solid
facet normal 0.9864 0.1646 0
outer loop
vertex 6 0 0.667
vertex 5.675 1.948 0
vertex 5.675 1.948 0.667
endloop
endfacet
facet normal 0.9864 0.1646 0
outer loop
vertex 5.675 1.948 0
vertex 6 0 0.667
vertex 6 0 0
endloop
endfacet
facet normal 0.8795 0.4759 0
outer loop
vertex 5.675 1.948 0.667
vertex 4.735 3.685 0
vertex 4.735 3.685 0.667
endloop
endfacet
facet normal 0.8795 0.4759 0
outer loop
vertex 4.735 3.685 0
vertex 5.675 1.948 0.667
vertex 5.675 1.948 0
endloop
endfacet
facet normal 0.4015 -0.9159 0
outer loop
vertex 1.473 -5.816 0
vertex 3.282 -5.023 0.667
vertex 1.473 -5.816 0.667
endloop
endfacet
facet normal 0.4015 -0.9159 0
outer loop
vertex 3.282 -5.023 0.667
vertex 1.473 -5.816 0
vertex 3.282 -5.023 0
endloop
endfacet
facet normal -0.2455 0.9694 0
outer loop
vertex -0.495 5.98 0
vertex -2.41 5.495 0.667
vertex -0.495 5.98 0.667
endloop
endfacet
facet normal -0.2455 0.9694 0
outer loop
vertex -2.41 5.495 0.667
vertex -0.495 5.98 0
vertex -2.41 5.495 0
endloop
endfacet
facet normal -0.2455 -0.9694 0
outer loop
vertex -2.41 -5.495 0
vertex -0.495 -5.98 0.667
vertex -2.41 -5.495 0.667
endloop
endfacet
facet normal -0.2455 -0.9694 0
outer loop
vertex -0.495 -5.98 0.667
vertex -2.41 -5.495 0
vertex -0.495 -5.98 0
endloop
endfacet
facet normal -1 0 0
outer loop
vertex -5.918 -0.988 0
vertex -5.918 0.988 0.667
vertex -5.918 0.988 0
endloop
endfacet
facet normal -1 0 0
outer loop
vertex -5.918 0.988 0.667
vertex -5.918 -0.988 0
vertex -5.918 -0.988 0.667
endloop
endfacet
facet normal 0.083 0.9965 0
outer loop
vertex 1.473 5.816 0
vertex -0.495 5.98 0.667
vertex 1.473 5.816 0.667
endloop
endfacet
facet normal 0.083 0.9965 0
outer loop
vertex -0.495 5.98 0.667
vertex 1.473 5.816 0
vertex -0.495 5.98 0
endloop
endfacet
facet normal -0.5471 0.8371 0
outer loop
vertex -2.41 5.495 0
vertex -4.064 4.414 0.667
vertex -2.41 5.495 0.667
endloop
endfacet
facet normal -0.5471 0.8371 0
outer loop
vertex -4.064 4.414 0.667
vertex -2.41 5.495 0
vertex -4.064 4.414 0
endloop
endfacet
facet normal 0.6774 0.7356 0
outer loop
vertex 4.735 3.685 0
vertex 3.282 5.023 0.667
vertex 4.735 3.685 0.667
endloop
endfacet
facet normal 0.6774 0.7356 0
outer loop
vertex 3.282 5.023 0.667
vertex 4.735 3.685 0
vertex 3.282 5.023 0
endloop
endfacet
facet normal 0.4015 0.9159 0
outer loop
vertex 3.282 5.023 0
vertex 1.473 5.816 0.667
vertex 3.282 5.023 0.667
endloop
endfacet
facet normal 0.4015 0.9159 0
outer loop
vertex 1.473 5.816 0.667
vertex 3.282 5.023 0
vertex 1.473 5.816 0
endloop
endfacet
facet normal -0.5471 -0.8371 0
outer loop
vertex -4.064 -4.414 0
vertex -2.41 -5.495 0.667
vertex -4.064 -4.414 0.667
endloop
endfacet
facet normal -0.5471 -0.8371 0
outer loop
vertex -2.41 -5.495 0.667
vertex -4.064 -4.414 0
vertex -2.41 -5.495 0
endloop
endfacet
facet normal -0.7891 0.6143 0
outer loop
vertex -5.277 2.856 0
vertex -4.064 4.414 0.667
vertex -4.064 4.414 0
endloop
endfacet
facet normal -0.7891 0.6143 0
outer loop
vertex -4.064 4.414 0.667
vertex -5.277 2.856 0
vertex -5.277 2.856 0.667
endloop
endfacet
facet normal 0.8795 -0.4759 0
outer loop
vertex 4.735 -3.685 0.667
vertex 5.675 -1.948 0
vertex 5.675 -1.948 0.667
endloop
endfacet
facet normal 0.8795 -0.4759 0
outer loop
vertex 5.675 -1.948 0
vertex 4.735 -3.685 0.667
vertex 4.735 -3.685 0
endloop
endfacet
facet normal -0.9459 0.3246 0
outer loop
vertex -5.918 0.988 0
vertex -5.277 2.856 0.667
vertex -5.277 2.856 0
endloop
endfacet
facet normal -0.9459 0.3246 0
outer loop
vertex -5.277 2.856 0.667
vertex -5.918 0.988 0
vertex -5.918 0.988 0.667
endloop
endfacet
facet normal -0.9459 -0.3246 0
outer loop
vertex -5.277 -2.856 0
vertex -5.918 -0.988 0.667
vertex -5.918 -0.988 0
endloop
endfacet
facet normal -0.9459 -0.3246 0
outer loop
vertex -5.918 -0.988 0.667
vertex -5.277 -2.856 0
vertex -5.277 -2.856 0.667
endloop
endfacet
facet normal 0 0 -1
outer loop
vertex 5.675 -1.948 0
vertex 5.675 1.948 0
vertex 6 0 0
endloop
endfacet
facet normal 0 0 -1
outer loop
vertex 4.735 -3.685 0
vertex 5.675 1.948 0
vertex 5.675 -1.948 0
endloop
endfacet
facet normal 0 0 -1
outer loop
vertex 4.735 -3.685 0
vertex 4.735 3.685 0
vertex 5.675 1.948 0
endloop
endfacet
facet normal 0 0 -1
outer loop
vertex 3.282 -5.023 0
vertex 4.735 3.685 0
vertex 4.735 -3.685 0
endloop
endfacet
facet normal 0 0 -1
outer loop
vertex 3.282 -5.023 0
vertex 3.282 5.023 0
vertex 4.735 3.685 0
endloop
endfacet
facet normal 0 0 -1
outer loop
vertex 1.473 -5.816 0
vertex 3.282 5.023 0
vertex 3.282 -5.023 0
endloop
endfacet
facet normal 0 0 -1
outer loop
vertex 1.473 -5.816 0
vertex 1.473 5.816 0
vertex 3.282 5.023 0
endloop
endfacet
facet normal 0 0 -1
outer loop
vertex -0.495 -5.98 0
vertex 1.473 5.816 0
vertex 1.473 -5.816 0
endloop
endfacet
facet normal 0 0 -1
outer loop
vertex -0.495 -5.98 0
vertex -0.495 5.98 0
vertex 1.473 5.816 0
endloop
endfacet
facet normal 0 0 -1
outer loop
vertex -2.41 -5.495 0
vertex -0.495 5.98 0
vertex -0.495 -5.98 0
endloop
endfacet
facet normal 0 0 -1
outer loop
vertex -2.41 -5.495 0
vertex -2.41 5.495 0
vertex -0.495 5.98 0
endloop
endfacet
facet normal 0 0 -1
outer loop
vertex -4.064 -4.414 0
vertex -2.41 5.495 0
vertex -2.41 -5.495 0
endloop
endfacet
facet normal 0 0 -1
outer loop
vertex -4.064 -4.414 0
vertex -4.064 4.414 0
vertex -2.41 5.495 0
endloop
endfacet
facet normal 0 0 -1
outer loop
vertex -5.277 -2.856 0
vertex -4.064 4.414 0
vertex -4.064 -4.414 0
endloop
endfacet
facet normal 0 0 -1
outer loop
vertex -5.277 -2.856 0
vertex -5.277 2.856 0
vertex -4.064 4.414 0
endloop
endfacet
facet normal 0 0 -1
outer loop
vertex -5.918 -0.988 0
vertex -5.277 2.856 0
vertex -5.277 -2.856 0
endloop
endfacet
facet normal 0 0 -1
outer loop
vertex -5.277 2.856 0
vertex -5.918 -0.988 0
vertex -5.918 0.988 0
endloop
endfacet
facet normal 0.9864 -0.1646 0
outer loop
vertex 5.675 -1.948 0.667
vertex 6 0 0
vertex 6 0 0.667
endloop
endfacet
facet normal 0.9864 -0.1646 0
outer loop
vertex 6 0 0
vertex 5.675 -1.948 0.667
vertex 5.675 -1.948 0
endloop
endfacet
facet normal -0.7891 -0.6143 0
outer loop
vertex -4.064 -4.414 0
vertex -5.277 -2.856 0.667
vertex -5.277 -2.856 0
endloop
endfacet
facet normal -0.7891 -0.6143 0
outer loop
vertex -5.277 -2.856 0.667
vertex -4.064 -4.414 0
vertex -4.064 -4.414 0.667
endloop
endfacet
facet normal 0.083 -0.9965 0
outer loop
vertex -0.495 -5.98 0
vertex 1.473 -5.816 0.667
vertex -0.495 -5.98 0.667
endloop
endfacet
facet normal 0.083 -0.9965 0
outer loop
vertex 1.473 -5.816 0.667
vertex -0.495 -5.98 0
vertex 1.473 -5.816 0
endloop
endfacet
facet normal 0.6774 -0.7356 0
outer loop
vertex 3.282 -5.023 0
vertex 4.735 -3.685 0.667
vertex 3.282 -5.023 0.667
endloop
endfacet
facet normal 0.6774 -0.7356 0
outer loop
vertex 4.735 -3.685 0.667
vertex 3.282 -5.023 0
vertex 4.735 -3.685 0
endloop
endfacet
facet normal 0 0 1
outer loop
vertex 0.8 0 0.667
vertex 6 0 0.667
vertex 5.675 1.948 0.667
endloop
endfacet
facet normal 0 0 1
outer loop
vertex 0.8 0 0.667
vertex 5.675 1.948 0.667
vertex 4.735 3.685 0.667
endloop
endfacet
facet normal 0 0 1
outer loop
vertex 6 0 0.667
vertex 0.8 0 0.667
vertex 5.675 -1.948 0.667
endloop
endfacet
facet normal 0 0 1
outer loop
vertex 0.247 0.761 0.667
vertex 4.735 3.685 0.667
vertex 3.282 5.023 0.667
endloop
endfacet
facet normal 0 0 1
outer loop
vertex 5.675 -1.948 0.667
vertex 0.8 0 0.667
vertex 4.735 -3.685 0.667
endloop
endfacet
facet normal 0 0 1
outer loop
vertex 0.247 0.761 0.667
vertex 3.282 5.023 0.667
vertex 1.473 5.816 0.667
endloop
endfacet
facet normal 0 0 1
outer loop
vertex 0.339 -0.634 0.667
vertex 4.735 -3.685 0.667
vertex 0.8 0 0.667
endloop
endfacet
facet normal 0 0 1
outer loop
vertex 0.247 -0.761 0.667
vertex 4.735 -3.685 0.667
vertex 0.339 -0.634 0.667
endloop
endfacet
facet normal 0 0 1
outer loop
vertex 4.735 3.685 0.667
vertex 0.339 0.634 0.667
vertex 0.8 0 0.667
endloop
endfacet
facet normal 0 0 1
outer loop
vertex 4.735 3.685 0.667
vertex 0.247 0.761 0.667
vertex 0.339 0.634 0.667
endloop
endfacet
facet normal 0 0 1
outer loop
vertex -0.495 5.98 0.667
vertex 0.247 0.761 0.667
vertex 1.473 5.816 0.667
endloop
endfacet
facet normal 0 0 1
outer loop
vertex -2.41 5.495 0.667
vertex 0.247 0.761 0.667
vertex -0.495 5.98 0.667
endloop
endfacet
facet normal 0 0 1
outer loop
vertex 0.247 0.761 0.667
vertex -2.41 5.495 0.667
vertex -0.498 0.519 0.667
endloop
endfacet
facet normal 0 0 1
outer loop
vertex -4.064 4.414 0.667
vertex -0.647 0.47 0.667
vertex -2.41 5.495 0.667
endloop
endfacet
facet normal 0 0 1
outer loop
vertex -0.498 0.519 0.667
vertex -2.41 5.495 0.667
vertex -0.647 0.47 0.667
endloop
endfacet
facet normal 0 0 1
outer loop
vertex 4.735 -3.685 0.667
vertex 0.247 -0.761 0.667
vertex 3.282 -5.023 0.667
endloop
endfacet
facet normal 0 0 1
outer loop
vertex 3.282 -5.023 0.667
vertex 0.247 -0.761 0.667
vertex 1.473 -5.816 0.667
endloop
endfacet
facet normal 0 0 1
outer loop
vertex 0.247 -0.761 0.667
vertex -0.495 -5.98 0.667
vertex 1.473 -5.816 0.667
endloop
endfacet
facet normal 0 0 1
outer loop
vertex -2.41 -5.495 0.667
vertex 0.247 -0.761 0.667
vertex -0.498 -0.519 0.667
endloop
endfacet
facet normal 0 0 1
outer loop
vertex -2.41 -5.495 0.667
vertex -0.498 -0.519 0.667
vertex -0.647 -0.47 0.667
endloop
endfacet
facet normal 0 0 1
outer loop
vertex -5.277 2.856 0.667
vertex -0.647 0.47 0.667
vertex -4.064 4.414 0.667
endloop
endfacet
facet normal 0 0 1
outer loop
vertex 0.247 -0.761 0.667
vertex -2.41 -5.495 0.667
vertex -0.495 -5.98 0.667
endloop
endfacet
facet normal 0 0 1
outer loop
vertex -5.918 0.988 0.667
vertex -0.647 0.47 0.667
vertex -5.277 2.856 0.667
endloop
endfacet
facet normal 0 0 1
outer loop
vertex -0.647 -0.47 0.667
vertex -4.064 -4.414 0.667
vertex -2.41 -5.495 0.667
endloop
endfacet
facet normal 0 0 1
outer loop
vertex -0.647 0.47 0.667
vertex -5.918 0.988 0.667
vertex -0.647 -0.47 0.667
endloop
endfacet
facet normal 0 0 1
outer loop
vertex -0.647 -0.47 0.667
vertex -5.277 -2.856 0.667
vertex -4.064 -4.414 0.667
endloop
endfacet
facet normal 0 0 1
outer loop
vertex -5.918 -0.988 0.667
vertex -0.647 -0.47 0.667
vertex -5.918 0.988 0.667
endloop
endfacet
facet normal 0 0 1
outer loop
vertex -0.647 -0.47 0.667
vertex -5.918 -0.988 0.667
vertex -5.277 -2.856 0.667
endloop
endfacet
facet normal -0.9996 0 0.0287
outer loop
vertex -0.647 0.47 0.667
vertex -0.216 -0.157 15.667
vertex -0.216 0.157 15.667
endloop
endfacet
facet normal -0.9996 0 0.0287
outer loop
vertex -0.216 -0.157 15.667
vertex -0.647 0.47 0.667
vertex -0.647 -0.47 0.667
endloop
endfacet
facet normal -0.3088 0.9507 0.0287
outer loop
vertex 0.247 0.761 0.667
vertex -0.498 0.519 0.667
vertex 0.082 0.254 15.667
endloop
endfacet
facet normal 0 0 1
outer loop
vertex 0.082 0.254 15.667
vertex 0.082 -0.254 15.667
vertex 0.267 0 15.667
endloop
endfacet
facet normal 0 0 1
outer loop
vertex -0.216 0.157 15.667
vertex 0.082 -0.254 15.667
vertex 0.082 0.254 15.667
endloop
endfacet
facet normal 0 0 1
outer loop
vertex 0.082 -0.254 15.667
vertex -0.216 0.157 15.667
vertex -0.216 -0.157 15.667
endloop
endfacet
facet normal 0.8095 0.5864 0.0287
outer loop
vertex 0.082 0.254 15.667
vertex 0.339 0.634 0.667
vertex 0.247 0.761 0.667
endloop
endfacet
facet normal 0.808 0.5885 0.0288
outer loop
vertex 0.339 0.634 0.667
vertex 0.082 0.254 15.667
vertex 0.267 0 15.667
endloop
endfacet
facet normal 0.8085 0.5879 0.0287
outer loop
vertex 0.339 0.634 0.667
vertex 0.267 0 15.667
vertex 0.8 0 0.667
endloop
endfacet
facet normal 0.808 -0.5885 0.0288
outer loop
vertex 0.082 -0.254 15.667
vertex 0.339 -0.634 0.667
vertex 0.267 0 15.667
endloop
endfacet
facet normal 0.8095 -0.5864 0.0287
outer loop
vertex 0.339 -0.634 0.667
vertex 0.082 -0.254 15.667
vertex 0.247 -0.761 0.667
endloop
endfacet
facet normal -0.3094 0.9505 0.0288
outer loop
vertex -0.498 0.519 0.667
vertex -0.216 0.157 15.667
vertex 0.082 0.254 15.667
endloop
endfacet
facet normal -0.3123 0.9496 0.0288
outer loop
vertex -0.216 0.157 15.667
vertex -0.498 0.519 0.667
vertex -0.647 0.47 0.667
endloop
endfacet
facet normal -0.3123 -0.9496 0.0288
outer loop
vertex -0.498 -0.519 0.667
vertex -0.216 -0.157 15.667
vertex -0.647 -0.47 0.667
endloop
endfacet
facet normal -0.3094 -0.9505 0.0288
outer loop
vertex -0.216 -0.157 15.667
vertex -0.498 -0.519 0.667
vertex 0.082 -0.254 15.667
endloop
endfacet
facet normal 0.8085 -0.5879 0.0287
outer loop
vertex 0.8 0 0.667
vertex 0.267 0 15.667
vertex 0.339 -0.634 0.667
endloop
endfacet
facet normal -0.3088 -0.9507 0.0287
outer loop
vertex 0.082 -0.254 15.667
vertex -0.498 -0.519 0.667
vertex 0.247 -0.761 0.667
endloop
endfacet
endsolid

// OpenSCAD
wallThick = 2;
cutterMinimum = 0.4;
baseHeight = 2;
height = 15;
flangeWidth = 6;

minkowski(){
    outline();
    cylinder(r1 = wallThick/3, r2 = cutterMinimum/3, h = height);
};

flange();

module flange(){
	difference(){
        minkowski(){
            baseShape(baseHeight/3);
            cylinder(r = flangeWidth, h = baseHeight/3);
        }
        translate([0,0,-0.01])baseShape(baseHeight*1.1);
	};
}



module outline(){
	difference(){
        minkowski(){
            baseShape(baseHeight/3);
            cylinder(r = cutterMinimum/3, h = baseHeight/3);
        }
        translate([0,0,-0.01]) baseShape(baseHeight*1.1);
	};
};

module baseShape(H){
    linear_extrude() import (file = "Z10.dxf", layer="cookie", height=H);
}
